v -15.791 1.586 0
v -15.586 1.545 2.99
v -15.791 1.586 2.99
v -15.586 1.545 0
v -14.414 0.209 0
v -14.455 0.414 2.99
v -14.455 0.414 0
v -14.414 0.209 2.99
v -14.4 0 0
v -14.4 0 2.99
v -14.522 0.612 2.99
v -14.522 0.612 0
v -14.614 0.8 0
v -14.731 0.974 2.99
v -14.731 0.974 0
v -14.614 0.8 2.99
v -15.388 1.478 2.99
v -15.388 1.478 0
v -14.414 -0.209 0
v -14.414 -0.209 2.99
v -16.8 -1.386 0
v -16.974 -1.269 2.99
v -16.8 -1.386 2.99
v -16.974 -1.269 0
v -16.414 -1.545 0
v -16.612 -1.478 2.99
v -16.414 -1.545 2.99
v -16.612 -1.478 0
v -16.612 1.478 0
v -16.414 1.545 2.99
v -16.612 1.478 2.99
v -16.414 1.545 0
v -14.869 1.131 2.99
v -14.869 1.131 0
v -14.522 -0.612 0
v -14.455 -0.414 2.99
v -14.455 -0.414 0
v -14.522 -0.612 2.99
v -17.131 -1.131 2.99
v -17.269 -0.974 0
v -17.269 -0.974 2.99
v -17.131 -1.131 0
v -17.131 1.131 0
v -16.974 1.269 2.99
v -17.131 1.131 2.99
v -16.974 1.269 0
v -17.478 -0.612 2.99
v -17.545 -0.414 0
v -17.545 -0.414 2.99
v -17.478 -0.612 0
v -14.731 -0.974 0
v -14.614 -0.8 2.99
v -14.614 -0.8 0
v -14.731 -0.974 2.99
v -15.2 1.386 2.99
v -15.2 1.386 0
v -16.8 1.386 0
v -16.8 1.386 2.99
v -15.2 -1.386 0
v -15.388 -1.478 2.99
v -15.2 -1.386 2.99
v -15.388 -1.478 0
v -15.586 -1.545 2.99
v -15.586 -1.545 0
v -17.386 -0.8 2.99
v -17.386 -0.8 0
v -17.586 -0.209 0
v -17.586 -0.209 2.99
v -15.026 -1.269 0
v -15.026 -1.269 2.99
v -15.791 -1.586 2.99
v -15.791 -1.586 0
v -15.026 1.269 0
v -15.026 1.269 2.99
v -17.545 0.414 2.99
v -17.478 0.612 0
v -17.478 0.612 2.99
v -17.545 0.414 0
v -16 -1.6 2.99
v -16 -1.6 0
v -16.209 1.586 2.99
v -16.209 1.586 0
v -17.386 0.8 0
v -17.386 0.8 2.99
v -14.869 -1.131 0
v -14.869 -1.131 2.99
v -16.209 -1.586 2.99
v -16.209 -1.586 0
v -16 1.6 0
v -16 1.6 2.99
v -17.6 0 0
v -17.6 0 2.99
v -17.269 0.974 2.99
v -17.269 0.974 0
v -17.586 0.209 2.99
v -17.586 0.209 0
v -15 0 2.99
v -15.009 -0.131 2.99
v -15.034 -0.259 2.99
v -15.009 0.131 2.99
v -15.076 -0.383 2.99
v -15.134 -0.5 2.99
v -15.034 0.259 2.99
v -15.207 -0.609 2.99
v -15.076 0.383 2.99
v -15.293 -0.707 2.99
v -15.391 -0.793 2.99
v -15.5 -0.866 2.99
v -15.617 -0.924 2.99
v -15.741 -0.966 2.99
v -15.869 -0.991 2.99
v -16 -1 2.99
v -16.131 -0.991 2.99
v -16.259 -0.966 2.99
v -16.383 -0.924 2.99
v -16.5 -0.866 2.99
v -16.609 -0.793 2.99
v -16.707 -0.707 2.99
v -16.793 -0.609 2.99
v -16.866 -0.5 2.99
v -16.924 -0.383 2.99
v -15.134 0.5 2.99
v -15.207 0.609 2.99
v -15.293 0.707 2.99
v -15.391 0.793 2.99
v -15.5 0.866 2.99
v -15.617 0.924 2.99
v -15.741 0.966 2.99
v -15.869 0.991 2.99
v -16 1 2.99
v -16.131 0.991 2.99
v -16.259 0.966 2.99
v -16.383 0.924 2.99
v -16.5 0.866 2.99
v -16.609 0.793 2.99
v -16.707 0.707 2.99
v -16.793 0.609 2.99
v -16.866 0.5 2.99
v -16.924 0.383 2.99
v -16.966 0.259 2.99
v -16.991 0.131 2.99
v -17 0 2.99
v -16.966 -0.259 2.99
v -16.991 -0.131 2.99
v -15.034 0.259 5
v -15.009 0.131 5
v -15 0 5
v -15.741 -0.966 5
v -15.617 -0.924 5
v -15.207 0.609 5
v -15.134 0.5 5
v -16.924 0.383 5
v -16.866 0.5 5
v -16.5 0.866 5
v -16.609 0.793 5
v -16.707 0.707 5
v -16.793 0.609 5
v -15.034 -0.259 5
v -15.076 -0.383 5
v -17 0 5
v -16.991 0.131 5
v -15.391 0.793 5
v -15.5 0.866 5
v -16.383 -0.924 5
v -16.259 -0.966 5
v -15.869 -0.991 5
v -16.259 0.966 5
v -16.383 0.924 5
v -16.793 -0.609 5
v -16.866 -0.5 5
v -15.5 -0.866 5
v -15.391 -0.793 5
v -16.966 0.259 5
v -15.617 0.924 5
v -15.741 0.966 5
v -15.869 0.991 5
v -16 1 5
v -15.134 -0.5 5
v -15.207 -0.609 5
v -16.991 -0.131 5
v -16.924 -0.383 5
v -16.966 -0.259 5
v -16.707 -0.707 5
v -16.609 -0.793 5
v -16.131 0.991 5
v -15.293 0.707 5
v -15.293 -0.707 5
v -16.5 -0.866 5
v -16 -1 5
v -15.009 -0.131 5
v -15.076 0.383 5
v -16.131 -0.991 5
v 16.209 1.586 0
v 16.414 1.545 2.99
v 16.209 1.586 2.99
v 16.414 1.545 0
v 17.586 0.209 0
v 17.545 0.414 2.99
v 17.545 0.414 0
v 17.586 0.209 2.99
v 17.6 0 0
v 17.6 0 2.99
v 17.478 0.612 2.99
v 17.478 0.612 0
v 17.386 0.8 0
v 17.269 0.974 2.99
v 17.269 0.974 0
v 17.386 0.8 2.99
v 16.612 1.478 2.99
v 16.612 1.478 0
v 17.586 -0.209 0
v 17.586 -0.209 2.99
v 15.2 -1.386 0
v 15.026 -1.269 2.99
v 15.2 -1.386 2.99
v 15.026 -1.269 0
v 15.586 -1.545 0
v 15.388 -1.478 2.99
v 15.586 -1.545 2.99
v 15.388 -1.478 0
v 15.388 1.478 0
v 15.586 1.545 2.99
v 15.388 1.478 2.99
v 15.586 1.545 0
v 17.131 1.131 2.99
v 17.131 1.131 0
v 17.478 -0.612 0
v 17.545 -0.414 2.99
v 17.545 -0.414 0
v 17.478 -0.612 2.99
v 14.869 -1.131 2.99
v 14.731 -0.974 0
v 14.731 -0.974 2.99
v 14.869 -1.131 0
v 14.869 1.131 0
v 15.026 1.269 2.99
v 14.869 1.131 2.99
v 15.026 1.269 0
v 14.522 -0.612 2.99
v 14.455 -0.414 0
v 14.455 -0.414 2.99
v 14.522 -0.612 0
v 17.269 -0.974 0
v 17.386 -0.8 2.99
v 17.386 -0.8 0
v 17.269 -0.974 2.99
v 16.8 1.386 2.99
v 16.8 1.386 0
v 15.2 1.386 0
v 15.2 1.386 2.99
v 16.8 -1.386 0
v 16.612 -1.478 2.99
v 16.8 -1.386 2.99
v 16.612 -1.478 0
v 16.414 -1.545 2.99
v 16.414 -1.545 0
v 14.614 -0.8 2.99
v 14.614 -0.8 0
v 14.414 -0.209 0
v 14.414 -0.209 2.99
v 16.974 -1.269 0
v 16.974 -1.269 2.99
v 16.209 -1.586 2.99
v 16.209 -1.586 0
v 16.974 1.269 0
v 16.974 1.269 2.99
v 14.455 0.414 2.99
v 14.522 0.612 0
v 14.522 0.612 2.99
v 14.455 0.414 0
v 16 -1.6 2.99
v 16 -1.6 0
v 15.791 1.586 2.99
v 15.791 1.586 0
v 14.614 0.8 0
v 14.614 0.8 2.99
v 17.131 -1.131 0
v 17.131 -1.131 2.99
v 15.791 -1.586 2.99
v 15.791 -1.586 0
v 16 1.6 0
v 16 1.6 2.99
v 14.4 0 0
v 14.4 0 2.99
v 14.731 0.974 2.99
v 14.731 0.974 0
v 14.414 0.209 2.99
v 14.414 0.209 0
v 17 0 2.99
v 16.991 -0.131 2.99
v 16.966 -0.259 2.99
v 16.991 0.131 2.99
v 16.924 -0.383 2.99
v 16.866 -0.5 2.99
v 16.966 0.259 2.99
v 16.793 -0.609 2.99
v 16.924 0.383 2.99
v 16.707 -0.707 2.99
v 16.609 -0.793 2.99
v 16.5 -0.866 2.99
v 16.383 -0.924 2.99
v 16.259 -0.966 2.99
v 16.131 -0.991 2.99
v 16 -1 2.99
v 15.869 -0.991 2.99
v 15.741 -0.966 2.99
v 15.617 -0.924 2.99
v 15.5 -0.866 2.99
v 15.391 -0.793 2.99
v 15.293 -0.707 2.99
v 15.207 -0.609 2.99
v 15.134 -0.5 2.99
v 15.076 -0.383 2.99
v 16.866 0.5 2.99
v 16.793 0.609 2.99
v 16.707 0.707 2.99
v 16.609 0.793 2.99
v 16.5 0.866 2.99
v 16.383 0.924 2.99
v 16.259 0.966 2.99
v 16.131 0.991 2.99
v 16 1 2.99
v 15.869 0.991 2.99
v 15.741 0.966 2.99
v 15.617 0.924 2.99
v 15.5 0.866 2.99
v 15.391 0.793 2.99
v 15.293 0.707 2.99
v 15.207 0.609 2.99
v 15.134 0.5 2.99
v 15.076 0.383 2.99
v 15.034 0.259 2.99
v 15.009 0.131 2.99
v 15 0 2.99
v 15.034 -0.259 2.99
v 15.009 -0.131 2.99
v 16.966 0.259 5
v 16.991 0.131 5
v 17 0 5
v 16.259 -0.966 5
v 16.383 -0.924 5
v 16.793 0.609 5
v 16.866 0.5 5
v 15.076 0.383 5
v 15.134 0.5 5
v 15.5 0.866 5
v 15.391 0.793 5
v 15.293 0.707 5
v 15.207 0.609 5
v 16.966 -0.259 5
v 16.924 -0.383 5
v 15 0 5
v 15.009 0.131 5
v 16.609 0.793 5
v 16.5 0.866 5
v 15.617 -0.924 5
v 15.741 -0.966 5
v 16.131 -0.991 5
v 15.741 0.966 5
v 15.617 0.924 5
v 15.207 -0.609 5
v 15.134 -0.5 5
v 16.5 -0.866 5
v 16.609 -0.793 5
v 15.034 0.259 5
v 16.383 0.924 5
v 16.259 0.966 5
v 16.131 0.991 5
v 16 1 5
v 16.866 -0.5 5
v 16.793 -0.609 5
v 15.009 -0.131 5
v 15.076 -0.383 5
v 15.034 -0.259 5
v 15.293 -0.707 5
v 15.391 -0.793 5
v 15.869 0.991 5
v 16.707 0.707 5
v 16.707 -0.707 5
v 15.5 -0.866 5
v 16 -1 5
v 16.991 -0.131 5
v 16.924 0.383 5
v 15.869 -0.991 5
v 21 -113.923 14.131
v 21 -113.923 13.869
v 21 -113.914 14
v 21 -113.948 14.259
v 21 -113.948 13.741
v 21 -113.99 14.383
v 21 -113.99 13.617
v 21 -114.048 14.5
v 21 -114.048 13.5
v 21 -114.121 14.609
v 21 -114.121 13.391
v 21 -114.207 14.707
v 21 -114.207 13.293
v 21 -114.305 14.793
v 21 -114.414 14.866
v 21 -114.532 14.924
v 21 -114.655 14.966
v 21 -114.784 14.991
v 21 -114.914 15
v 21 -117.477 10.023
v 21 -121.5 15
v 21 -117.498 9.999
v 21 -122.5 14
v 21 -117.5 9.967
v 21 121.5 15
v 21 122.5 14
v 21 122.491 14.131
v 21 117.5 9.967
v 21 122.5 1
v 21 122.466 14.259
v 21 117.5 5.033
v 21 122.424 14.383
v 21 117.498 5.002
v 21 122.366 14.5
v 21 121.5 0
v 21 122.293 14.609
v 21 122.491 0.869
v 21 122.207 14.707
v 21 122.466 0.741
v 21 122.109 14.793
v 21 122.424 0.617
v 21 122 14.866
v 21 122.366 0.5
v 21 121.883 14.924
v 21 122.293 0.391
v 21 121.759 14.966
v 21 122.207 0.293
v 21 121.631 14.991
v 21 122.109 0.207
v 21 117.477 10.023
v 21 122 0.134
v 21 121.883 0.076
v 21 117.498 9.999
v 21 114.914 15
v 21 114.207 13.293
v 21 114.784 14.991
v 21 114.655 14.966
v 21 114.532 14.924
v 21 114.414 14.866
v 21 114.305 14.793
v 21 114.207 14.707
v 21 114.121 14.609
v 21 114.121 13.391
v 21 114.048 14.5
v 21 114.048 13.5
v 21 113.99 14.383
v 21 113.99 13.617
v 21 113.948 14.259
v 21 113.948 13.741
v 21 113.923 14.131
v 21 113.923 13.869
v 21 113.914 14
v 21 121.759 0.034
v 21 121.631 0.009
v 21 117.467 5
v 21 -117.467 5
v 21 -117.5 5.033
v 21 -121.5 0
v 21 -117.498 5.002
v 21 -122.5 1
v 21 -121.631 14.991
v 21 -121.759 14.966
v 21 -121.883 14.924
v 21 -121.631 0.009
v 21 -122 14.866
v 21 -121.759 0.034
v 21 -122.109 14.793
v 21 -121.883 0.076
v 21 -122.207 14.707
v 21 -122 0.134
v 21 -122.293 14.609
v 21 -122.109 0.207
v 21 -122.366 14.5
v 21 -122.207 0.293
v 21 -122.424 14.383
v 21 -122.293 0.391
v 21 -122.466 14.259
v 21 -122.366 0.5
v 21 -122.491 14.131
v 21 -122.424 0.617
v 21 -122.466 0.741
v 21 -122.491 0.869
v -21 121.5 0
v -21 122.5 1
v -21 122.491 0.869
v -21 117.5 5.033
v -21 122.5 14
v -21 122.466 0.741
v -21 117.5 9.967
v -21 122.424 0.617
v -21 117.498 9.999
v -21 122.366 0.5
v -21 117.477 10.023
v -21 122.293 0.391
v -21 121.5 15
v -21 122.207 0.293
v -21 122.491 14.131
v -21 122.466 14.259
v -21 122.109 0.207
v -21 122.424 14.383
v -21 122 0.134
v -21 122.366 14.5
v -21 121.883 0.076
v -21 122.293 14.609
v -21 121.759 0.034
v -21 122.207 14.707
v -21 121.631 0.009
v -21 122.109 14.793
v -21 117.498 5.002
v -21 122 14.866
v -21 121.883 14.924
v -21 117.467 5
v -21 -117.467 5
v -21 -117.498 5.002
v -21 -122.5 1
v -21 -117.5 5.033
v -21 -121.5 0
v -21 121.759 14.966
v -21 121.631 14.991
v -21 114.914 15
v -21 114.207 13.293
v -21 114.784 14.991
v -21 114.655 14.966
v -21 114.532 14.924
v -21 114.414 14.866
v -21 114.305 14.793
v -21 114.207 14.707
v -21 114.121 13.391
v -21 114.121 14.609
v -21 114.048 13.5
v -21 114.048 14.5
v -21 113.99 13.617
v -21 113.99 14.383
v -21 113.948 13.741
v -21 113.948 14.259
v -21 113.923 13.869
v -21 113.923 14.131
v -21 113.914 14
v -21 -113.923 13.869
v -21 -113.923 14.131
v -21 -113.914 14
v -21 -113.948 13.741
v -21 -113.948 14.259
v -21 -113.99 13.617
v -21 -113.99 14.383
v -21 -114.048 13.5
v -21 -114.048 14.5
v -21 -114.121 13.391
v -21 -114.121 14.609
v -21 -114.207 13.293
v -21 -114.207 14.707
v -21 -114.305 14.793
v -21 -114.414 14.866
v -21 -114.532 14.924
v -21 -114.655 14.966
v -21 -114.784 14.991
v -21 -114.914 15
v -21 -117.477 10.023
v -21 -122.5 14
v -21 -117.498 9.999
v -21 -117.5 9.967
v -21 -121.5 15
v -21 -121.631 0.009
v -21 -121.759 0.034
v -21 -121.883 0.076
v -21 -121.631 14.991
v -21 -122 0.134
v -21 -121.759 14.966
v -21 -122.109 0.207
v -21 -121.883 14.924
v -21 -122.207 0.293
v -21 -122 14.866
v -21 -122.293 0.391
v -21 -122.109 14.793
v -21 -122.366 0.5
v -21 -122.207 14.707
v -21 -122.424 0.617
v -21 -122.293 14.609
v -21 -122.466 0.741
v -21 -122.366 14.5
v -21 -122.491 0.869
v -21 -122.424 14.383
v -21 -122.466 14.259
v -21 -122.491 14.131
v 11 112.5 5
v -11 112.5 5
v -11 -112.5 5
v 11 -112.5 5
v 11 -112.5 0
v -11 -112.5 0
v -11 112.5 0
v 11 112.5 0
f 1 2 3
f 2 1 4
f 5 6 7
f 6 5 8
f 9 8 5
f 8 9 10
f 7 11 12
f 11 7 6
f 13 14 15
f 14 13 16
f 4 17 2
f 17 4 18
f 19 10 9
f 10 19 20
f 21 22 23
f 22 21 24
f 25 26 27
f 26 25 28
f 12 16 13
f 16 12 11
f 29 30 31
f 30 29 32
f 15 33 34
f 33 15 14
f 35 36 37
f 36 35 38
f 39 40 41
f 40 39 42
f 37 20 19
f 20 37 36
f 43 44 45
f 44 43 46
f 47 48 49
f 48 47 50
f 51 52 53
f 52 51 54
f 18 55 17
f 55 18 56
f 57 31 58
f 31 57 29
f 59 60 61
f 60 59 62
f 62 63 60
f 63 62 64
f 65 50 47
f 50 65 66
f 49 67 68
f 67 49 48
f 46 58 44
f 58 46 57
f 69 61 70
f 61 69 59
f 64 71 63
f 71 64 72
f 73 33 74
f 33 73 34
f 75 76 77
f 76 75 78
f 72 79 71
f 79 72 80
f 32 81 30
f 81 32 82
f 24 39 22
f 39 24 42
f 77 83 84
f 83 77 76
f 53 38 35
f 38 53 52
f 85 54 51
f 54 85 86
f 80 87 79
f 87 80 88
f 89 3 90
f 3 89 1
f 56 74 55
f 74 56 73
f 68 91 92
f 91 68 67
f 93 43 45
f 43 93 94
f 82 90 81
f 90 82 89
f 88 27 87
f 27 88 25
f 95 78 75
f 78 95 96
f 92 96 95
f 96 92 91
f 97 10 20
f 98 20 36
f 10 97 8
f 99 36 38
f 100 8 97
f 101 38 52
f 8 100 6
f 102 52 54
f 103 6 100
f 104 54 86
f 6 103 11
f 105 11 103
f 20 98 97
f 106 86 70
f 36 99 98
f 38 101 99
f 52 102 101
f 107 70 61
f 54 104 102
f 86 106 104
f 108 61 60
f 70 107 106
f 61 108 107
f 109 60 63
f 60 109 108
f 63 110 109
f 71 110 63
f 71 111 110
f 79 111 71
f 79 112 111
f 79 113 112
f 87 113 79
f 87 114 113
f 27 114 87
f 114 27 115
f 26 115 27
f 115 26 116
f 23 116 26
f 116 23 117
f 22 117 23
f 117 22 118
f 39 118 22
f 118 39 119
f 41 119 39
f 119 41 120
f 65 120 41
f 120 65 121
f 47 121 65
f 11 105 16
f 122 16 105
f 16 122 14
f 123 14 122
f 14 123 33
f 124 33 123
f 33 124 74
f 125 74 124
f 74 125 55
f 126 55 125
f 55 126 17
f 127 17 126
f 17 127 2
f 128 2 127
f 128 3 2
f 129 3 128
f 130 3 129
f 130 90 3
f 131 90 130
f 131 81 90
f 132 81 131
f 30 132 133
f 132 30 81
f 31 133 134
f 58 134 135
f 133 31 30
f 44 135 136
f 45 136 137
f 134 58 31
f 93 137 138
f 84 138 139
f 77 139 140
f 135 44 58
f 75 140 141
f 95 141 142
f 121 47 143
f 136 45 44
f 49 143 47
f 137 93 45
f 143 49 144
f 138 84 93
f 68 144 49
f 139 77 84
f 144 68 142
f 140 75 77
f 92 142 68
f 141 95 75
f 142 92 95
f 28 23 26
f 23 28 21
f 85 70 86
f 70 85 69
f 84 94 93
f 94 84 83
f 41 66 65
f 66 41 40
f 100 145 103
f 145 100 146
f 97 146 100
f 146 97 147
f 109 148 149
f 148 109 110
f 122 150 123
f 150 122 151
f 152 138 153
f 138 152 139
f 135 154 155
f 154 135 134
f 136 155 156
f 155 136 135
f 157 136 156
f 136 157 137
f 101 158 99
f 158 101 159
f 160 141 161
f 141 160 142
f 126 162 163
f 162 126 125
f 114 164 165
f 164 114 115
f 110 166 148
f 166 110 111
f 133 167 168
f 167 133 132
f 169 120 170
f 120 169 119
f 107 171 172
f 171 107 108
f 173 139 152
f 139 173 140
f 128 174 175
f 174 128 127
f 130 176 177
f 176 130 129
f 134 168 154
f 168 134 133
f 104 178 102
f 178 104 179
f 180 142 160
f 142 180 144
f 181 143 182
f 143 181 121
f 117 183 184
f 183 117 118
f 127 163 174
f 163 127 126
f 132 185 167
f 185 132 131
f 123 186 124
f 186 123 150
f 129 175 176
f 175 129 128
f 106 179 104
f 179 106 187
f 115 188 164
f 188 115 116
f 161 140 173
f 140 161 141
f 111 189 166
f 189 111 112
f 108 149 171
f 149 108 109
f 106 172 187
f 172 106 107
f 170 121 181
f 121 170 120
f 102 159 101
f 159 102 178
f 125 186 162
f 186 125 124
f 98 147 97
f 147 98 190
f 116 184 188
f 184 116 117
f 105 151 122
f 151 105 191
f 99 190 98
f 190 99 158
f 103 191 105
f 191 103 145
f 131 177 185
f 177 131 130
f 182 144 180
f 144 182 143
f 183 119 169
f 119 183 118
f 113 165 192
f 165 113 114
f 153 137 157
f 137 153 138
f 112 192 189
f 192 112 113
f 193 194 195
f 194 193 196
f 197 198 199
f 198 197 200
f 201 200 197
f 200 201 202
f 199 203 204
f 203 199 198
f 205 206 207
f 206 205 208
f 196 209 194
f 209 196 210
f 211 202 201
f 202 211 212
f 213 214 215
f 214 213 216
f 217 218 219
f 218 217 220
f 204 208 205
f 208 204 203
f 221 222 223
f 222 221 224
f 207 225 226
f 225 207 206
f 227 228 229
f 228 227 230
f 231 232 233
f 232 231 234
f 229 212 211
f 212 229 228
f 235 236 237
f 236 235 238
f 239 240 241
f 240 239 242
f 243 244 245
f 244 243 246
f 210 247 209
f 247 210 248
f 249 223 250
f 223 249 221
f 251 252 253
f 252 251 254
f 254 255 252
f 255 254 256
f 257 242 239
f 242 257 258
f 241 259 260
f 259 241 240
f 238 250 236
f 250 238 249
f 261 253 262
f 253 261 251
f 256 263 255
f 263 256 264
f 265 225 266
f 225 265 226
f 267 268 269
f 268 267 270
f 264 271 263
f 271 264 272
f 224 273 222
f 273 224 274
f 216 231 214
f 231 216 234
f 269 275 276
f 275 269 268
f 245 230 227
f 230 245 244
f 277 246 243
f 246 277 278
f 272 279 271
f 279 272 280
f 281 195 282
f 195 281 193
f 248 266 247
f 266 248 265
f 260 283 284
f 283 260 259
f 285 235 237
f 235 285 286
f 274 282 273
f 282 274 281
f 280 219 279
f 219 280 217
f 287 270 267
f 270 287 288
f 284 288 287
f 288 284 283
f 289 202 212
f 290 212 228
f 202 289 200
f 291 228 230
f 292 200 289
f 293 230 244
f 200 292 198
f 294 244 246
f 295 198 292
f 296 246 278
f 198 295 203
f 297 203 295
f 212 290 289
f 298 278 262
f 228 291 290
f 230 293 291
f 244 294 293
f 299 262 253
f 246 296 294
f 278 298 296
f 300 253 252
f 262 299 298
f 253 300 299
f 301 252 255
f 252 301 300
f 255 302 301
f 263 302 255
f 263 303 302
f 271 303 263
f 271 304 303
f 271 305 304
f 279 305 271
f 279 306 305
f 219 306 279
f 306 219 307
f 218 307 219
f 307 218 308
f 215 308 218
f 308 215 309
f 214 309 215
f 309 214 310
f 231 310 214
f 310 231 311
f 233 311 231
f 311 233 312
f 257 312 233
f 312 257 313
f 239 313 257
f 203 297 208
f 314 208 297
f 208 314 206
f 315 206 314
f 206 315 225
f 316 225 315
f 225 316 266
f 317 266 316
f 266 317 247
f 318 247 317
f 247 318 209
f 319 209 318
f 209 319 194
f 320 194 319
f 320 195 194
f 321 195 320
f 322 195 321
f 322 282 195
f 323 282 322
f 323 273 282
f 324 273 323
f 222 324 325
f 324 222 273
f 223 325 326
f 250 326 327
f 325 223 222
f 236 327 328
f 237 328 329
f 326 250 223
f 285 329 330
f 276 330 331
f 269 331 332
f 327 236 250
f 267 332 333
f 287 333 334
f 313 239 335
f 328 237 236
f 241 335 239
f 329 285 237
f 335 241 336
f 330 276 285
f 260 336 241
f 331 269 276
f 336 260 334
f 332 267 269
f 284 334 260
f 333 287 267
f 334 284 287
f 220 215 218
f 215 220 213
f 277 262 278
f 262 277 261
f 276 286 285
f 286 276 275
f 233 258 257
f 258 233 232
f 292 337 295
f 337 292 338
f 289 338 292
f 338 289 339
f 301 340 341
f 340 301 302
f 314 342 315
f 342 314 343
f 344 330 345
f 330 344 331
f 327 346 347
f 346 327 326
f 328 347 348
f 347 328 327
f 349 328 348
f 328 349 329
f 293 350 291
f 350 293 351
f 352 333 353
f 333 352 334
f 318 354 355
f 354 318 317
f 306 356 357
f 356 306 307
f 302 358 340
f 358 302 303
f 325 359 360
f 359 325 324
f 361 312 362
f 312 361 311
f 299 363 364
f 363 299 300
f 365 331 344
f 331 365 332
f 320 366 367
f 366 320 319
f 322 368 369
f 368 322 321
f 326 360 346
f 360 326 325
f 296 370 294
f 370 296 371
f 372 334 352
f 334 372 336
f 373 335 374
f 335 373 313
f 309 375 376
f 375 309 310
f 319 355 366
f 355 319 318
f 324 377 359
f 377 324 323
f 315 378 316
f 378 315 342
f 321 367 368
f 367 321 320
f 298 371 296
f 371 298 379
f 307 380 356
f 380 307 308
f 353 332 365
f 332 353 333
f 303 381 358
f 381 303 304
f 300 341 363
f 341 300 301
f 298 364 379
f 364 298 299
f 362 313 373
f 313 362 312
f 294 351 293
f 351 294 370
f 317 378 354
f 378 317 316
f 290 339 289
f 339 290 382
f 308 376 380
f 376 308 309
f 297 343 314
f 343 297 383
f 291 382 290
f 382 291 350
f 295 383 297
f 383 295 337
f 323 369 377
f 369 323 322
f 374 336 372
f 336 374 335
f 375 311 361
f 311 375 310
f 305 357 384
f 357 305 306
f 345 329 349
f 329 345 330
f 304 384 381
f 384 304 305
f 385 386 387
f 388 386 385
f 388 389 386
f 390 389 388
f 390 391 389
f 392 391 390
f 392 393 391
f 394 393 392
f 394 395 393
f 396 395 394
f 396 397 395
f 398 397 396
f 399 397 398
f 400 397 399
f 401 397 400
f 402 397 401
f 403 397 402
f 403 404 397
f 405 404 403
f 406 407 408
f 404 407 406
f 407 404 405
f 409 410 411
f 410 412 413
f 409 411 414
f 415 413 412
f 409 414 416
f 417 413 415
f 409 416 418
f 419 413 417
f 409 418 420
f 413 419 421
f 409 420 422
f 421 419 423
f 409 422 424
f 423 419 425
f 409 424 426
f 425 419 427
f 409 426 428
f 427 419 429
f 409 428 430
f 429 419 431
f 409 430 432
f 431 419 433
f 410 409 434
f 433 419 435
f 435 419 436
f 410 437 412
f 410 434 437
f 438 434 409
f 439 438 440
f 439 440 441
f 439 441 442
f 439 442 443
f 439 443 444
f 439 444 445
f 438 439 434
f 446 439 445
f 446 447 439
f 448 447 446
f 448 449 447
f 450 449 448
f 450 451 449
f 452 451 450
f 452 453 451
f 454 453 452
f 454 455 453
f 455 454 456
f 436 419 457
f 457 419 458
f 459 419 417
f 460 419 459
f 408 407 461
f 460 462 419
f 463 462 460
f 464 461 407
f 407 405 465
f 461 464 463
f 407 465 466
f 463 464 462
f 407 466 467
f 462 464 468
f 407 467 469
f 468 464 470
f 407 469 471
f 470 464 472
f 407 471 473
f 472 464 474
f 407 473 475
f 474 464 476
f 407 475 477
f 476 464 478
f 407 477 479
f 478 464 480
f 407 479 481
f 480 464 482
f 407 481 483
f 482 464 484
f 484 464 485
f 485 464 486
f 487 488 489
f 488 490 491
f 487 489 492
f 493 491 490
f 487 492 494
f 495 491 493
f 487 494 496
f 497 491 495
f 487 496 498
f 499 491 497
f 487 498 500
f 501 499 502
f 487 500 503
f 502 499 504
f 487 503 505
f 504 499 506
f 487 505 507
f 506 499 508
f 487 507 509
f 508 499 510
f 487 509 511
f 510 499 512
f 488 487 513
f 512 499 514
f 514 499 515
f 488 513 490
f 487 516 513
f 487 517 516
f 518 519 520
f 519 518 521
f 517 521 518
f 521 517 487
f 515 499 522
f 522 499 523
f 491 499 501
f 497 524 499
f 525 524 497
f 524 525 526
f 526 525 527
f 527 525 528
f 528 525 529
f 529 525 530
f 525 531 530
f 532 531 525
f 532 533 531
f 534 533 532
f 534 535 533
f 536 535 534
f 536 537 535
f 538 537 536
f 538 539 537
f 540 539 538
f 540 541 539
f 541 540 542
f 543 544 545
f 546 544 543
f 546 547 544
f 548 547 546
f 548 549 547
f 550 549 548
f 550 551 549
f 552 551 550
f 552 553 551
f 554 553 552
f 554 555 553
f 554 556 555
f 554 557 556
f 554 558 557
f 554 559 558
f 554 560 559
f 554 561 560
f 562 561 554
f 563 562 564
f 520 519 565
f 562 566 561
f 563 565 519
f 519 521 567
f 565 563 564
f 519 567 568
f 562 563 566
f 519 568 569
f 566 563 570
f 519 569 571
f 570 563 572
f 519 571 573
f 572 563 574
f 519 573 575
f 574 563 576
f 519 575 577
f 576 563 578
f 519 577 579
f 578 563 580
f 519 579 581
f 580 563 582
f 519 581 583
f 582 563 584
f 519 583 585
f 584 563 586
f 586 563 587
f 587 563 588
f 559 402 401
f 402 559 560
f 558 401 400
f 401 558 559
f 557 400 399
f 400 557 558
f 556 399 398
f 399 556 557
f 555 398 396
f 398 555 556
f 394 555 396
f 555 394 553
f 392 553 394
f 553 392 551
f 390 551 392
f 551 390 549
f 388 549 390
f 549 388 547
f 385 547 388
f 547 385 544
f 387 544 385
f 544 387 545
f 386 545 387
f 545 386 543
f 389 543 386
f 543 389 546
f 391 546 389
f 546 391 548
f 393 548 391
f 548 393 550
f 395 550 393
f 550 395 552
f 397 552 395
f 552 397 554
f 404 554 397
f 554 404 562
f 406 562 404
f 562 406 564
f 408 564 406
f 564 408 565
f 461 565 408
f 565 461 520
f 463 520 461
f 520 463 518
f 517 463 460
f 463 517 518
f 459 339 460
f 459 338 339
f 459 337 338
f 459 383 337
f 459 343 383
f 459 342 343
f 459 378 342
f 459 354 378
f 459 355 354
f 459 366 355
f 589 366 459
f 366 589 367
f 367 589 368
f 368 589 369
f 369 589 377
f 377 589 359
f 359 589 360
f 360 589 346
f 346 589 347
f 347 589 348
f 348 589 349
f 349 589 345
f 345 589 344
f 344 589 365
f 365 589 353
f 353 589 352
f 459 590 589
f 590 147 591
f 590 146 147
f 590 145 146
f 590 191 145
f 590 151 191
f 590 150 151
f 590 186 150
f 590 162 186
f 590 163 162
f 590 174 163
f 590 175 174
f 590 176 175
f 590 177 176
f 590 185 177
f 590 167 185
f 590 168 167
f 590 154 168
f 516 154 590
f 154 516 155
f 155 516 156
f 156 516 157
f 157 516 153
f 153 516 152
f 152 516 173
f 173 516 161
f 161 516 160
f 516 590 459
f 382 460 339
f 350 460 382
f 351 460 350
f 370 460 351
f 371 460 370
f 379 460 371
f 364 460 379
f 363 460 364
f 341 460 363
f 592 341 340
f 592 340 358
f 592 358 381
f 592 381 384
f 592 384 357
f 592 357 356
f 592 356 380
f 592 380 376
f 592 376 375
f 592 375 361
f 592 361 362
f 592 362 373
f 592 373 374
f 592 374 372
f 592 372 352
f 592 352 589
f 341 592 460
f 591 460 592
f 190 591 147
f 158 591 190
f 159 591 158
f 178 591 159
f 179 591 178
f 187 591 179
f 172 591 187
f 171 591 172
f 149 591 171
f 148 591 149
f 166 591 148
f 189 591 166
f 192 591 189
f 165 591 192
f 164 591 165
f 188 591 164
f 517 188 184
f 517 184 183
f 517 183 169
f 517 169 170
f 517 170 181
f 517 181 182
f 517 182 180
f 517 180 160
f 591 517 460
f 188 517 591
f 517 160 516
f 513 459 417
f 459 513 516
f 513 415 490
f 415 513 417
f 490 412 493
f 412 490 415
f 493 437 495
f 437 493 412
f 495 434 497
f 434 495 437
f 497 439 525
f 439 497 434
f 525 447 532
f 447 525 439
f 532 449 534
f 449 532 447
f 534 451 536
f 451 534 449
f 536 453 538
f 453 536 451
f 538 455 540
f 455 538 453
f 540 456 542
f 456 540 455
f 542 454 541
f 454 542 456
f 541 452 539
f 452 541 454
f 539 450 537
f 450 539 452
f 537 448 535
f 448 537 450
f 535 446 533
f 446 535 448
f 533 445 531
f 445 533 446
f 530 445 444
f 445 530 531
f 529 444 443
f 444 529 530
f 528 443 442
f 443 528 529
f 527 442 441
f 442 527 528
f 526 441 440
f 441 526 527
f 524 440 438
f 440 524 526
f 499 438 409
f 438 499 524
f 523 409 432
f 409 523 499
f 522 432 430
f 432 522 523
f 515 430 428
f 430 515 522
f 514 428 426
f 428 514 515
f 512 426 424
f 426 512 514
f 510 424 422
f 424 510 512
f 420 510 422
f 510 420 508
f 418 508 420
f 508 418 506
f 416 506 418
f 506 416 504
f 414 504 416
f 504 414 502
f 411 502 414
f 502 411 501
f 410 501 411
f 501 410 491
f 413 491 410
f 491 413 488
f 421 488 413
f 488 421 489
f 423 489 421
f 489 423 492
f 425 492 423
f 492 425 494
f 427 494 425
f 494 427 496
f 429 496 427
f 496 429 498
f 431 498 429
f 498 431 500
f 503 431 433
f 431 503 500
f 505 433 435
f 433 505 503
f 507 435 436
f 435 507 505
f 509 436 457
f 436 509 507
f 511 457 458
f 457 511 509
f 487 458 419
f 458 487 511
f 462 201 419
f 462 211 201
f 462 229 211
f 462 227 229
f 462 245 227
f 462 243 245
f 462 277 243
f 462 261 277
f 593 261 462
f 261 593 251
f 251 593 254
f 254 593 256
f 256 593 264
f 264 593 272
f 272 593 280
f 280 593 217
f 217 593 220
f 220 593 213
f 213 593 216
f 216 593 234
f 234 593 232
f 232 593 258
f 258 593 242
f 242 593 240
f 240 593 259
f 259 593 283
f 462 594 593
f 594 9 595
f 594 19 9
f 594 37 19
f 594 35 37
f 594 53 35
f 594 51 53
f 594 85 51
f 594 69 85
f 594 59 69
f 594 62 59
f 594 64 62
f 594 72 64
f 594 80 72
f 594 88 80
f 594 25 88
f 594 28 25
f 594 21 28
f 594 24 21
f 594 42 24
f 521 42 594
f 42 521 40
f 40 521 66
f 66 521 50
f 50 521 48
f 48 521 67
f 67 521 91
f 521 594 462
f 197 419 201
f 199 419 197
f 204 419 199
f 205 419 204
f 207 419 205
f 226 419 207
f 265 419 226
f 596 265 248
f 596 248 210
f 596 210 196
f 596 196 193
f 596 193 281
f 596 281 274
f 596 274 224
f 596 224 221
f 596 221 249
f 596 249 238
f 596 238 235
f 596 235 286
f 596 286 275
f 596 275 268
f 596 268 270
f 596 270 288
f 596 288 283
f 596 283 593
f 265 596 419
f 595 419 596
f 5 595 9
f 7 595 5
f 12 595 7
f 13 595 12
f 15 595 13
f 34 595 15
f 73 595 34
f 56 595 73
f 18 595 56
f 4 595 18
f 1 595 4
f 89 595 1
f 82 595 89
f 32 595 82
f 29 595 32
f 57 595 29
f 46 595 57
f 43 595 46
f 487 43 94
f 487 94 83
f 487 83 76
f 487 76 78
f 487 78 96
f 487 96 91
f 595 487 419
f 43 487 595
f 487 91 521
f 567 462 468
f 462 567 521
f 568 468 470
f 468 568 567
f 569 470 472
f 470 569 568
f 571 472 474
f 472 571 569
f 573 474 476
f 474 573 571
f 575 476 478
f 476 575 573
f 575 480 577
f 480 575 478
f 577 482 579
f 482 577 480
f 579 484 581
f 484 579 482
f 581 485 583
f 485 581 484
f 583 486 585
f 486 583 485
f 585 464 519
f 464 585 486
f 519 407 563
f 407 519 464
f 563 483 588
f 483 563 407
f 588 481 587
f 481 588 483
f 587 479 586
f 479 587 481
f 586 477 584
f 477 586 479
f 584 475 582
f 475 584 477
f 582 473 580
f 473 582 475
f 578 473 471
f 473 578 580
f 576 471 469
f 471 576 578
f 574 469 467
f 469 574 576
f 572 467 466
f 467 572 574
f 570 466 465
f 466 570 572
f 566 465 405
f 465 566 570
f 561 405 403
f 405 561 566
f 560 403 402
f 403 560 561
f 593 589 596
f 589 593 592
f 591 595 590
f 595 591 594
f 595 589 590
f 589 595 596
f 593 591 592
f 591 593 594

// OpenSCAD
// file: ../../lib/fasteners.scad
INF = 10 ^ 5;
E = 0.01;


module screw(
    screw_l,
    screw_d,
    cap_l,
    cap_d
) {
    translate([0, 0, cap_l + E])
    rotate([180, 0, 0]) {
        cylinder(cap_l + screw_l, r = screw_d / 2);
        cylinder(cap_l, r = cap_d / 2);
    }
}


module screw_M2x6(hole = false) {
    screw(
        screw_l = hole ? 6 : 5.5,
        screw_d = hole ? 2 : 1.75,
        cap_l = hole ? INF : 1.75,
        cap_d = hole ? 4 : 3.5
    );
}


module heat_insert(
    insert_l,
    insert_d,
    screw_l,
    screw_d,
) {
    translate([0, 0, E])
    rotate([180, 0, 0]) {
        cylinder(insert_l, r = insert_d / 2);
        if (is_num(screw_d)) {
            cylinder(is_num(screw_l) ? screw_l : INF, r = screw_d / 2);
        }
    }
}


module heat_insert_M2(hole = false) {
    heat_insert(
        insert_l = 3,
        insert_d = hole ? 3.2 : 3.5,
        screw_l = undef,
        screw_d = hole ? 2 : undef
    );
}
// main file
use <../../lib/fasteners.scad>

bed_length = 235;
bed_thickness = 5;

accel_holes_dx = 32;

$fn = 48;


module holder() {
    t = 5;

    module profile() {
        offset(1)
        offset(-1)
        polygon([
            [  bed_length / 2 + t, 0],
            [  bed_length / 2 + t, - t - bed_thickness - t],
            [  bed_length / 2 - t, - t - bed_thickness - t],
            // [  bed_length / 2 - t, - t - bed_thickness],
            [  bed_length / 2,     - t - bed_thickness],
            [  bed_length / 2,     - t],
            [- bed_length / 2,     - t],
            [- bed_length / 2,     - t - bed_thickness],
            // [- bed_length / 2 + t, - t - bed_thickness],
            [- bed_length / 2 + t, - t - bed_thickness - t],
            [- bed_length / 2 - t, - t - bed_thickness - t],
            [- bed_length / 2 - t, 0],
        ], convexity = 10);
    }

    difference() {
        rotate([-90, 0, 90])
        linear_extrude(accel_holes_dx + t * 2, center = true)
        profile();

        for (x = [- accel_holes_dx / 2, accel_holes_dx / 2])
        translate([x, 0, 0])
        rotate([180, 0, 0])
        heat_insert_M2(true);

        cube([accel_holes_dx - t * 2, bed_length - t * 2, t * 3], center = true);
    }
}

holder();
